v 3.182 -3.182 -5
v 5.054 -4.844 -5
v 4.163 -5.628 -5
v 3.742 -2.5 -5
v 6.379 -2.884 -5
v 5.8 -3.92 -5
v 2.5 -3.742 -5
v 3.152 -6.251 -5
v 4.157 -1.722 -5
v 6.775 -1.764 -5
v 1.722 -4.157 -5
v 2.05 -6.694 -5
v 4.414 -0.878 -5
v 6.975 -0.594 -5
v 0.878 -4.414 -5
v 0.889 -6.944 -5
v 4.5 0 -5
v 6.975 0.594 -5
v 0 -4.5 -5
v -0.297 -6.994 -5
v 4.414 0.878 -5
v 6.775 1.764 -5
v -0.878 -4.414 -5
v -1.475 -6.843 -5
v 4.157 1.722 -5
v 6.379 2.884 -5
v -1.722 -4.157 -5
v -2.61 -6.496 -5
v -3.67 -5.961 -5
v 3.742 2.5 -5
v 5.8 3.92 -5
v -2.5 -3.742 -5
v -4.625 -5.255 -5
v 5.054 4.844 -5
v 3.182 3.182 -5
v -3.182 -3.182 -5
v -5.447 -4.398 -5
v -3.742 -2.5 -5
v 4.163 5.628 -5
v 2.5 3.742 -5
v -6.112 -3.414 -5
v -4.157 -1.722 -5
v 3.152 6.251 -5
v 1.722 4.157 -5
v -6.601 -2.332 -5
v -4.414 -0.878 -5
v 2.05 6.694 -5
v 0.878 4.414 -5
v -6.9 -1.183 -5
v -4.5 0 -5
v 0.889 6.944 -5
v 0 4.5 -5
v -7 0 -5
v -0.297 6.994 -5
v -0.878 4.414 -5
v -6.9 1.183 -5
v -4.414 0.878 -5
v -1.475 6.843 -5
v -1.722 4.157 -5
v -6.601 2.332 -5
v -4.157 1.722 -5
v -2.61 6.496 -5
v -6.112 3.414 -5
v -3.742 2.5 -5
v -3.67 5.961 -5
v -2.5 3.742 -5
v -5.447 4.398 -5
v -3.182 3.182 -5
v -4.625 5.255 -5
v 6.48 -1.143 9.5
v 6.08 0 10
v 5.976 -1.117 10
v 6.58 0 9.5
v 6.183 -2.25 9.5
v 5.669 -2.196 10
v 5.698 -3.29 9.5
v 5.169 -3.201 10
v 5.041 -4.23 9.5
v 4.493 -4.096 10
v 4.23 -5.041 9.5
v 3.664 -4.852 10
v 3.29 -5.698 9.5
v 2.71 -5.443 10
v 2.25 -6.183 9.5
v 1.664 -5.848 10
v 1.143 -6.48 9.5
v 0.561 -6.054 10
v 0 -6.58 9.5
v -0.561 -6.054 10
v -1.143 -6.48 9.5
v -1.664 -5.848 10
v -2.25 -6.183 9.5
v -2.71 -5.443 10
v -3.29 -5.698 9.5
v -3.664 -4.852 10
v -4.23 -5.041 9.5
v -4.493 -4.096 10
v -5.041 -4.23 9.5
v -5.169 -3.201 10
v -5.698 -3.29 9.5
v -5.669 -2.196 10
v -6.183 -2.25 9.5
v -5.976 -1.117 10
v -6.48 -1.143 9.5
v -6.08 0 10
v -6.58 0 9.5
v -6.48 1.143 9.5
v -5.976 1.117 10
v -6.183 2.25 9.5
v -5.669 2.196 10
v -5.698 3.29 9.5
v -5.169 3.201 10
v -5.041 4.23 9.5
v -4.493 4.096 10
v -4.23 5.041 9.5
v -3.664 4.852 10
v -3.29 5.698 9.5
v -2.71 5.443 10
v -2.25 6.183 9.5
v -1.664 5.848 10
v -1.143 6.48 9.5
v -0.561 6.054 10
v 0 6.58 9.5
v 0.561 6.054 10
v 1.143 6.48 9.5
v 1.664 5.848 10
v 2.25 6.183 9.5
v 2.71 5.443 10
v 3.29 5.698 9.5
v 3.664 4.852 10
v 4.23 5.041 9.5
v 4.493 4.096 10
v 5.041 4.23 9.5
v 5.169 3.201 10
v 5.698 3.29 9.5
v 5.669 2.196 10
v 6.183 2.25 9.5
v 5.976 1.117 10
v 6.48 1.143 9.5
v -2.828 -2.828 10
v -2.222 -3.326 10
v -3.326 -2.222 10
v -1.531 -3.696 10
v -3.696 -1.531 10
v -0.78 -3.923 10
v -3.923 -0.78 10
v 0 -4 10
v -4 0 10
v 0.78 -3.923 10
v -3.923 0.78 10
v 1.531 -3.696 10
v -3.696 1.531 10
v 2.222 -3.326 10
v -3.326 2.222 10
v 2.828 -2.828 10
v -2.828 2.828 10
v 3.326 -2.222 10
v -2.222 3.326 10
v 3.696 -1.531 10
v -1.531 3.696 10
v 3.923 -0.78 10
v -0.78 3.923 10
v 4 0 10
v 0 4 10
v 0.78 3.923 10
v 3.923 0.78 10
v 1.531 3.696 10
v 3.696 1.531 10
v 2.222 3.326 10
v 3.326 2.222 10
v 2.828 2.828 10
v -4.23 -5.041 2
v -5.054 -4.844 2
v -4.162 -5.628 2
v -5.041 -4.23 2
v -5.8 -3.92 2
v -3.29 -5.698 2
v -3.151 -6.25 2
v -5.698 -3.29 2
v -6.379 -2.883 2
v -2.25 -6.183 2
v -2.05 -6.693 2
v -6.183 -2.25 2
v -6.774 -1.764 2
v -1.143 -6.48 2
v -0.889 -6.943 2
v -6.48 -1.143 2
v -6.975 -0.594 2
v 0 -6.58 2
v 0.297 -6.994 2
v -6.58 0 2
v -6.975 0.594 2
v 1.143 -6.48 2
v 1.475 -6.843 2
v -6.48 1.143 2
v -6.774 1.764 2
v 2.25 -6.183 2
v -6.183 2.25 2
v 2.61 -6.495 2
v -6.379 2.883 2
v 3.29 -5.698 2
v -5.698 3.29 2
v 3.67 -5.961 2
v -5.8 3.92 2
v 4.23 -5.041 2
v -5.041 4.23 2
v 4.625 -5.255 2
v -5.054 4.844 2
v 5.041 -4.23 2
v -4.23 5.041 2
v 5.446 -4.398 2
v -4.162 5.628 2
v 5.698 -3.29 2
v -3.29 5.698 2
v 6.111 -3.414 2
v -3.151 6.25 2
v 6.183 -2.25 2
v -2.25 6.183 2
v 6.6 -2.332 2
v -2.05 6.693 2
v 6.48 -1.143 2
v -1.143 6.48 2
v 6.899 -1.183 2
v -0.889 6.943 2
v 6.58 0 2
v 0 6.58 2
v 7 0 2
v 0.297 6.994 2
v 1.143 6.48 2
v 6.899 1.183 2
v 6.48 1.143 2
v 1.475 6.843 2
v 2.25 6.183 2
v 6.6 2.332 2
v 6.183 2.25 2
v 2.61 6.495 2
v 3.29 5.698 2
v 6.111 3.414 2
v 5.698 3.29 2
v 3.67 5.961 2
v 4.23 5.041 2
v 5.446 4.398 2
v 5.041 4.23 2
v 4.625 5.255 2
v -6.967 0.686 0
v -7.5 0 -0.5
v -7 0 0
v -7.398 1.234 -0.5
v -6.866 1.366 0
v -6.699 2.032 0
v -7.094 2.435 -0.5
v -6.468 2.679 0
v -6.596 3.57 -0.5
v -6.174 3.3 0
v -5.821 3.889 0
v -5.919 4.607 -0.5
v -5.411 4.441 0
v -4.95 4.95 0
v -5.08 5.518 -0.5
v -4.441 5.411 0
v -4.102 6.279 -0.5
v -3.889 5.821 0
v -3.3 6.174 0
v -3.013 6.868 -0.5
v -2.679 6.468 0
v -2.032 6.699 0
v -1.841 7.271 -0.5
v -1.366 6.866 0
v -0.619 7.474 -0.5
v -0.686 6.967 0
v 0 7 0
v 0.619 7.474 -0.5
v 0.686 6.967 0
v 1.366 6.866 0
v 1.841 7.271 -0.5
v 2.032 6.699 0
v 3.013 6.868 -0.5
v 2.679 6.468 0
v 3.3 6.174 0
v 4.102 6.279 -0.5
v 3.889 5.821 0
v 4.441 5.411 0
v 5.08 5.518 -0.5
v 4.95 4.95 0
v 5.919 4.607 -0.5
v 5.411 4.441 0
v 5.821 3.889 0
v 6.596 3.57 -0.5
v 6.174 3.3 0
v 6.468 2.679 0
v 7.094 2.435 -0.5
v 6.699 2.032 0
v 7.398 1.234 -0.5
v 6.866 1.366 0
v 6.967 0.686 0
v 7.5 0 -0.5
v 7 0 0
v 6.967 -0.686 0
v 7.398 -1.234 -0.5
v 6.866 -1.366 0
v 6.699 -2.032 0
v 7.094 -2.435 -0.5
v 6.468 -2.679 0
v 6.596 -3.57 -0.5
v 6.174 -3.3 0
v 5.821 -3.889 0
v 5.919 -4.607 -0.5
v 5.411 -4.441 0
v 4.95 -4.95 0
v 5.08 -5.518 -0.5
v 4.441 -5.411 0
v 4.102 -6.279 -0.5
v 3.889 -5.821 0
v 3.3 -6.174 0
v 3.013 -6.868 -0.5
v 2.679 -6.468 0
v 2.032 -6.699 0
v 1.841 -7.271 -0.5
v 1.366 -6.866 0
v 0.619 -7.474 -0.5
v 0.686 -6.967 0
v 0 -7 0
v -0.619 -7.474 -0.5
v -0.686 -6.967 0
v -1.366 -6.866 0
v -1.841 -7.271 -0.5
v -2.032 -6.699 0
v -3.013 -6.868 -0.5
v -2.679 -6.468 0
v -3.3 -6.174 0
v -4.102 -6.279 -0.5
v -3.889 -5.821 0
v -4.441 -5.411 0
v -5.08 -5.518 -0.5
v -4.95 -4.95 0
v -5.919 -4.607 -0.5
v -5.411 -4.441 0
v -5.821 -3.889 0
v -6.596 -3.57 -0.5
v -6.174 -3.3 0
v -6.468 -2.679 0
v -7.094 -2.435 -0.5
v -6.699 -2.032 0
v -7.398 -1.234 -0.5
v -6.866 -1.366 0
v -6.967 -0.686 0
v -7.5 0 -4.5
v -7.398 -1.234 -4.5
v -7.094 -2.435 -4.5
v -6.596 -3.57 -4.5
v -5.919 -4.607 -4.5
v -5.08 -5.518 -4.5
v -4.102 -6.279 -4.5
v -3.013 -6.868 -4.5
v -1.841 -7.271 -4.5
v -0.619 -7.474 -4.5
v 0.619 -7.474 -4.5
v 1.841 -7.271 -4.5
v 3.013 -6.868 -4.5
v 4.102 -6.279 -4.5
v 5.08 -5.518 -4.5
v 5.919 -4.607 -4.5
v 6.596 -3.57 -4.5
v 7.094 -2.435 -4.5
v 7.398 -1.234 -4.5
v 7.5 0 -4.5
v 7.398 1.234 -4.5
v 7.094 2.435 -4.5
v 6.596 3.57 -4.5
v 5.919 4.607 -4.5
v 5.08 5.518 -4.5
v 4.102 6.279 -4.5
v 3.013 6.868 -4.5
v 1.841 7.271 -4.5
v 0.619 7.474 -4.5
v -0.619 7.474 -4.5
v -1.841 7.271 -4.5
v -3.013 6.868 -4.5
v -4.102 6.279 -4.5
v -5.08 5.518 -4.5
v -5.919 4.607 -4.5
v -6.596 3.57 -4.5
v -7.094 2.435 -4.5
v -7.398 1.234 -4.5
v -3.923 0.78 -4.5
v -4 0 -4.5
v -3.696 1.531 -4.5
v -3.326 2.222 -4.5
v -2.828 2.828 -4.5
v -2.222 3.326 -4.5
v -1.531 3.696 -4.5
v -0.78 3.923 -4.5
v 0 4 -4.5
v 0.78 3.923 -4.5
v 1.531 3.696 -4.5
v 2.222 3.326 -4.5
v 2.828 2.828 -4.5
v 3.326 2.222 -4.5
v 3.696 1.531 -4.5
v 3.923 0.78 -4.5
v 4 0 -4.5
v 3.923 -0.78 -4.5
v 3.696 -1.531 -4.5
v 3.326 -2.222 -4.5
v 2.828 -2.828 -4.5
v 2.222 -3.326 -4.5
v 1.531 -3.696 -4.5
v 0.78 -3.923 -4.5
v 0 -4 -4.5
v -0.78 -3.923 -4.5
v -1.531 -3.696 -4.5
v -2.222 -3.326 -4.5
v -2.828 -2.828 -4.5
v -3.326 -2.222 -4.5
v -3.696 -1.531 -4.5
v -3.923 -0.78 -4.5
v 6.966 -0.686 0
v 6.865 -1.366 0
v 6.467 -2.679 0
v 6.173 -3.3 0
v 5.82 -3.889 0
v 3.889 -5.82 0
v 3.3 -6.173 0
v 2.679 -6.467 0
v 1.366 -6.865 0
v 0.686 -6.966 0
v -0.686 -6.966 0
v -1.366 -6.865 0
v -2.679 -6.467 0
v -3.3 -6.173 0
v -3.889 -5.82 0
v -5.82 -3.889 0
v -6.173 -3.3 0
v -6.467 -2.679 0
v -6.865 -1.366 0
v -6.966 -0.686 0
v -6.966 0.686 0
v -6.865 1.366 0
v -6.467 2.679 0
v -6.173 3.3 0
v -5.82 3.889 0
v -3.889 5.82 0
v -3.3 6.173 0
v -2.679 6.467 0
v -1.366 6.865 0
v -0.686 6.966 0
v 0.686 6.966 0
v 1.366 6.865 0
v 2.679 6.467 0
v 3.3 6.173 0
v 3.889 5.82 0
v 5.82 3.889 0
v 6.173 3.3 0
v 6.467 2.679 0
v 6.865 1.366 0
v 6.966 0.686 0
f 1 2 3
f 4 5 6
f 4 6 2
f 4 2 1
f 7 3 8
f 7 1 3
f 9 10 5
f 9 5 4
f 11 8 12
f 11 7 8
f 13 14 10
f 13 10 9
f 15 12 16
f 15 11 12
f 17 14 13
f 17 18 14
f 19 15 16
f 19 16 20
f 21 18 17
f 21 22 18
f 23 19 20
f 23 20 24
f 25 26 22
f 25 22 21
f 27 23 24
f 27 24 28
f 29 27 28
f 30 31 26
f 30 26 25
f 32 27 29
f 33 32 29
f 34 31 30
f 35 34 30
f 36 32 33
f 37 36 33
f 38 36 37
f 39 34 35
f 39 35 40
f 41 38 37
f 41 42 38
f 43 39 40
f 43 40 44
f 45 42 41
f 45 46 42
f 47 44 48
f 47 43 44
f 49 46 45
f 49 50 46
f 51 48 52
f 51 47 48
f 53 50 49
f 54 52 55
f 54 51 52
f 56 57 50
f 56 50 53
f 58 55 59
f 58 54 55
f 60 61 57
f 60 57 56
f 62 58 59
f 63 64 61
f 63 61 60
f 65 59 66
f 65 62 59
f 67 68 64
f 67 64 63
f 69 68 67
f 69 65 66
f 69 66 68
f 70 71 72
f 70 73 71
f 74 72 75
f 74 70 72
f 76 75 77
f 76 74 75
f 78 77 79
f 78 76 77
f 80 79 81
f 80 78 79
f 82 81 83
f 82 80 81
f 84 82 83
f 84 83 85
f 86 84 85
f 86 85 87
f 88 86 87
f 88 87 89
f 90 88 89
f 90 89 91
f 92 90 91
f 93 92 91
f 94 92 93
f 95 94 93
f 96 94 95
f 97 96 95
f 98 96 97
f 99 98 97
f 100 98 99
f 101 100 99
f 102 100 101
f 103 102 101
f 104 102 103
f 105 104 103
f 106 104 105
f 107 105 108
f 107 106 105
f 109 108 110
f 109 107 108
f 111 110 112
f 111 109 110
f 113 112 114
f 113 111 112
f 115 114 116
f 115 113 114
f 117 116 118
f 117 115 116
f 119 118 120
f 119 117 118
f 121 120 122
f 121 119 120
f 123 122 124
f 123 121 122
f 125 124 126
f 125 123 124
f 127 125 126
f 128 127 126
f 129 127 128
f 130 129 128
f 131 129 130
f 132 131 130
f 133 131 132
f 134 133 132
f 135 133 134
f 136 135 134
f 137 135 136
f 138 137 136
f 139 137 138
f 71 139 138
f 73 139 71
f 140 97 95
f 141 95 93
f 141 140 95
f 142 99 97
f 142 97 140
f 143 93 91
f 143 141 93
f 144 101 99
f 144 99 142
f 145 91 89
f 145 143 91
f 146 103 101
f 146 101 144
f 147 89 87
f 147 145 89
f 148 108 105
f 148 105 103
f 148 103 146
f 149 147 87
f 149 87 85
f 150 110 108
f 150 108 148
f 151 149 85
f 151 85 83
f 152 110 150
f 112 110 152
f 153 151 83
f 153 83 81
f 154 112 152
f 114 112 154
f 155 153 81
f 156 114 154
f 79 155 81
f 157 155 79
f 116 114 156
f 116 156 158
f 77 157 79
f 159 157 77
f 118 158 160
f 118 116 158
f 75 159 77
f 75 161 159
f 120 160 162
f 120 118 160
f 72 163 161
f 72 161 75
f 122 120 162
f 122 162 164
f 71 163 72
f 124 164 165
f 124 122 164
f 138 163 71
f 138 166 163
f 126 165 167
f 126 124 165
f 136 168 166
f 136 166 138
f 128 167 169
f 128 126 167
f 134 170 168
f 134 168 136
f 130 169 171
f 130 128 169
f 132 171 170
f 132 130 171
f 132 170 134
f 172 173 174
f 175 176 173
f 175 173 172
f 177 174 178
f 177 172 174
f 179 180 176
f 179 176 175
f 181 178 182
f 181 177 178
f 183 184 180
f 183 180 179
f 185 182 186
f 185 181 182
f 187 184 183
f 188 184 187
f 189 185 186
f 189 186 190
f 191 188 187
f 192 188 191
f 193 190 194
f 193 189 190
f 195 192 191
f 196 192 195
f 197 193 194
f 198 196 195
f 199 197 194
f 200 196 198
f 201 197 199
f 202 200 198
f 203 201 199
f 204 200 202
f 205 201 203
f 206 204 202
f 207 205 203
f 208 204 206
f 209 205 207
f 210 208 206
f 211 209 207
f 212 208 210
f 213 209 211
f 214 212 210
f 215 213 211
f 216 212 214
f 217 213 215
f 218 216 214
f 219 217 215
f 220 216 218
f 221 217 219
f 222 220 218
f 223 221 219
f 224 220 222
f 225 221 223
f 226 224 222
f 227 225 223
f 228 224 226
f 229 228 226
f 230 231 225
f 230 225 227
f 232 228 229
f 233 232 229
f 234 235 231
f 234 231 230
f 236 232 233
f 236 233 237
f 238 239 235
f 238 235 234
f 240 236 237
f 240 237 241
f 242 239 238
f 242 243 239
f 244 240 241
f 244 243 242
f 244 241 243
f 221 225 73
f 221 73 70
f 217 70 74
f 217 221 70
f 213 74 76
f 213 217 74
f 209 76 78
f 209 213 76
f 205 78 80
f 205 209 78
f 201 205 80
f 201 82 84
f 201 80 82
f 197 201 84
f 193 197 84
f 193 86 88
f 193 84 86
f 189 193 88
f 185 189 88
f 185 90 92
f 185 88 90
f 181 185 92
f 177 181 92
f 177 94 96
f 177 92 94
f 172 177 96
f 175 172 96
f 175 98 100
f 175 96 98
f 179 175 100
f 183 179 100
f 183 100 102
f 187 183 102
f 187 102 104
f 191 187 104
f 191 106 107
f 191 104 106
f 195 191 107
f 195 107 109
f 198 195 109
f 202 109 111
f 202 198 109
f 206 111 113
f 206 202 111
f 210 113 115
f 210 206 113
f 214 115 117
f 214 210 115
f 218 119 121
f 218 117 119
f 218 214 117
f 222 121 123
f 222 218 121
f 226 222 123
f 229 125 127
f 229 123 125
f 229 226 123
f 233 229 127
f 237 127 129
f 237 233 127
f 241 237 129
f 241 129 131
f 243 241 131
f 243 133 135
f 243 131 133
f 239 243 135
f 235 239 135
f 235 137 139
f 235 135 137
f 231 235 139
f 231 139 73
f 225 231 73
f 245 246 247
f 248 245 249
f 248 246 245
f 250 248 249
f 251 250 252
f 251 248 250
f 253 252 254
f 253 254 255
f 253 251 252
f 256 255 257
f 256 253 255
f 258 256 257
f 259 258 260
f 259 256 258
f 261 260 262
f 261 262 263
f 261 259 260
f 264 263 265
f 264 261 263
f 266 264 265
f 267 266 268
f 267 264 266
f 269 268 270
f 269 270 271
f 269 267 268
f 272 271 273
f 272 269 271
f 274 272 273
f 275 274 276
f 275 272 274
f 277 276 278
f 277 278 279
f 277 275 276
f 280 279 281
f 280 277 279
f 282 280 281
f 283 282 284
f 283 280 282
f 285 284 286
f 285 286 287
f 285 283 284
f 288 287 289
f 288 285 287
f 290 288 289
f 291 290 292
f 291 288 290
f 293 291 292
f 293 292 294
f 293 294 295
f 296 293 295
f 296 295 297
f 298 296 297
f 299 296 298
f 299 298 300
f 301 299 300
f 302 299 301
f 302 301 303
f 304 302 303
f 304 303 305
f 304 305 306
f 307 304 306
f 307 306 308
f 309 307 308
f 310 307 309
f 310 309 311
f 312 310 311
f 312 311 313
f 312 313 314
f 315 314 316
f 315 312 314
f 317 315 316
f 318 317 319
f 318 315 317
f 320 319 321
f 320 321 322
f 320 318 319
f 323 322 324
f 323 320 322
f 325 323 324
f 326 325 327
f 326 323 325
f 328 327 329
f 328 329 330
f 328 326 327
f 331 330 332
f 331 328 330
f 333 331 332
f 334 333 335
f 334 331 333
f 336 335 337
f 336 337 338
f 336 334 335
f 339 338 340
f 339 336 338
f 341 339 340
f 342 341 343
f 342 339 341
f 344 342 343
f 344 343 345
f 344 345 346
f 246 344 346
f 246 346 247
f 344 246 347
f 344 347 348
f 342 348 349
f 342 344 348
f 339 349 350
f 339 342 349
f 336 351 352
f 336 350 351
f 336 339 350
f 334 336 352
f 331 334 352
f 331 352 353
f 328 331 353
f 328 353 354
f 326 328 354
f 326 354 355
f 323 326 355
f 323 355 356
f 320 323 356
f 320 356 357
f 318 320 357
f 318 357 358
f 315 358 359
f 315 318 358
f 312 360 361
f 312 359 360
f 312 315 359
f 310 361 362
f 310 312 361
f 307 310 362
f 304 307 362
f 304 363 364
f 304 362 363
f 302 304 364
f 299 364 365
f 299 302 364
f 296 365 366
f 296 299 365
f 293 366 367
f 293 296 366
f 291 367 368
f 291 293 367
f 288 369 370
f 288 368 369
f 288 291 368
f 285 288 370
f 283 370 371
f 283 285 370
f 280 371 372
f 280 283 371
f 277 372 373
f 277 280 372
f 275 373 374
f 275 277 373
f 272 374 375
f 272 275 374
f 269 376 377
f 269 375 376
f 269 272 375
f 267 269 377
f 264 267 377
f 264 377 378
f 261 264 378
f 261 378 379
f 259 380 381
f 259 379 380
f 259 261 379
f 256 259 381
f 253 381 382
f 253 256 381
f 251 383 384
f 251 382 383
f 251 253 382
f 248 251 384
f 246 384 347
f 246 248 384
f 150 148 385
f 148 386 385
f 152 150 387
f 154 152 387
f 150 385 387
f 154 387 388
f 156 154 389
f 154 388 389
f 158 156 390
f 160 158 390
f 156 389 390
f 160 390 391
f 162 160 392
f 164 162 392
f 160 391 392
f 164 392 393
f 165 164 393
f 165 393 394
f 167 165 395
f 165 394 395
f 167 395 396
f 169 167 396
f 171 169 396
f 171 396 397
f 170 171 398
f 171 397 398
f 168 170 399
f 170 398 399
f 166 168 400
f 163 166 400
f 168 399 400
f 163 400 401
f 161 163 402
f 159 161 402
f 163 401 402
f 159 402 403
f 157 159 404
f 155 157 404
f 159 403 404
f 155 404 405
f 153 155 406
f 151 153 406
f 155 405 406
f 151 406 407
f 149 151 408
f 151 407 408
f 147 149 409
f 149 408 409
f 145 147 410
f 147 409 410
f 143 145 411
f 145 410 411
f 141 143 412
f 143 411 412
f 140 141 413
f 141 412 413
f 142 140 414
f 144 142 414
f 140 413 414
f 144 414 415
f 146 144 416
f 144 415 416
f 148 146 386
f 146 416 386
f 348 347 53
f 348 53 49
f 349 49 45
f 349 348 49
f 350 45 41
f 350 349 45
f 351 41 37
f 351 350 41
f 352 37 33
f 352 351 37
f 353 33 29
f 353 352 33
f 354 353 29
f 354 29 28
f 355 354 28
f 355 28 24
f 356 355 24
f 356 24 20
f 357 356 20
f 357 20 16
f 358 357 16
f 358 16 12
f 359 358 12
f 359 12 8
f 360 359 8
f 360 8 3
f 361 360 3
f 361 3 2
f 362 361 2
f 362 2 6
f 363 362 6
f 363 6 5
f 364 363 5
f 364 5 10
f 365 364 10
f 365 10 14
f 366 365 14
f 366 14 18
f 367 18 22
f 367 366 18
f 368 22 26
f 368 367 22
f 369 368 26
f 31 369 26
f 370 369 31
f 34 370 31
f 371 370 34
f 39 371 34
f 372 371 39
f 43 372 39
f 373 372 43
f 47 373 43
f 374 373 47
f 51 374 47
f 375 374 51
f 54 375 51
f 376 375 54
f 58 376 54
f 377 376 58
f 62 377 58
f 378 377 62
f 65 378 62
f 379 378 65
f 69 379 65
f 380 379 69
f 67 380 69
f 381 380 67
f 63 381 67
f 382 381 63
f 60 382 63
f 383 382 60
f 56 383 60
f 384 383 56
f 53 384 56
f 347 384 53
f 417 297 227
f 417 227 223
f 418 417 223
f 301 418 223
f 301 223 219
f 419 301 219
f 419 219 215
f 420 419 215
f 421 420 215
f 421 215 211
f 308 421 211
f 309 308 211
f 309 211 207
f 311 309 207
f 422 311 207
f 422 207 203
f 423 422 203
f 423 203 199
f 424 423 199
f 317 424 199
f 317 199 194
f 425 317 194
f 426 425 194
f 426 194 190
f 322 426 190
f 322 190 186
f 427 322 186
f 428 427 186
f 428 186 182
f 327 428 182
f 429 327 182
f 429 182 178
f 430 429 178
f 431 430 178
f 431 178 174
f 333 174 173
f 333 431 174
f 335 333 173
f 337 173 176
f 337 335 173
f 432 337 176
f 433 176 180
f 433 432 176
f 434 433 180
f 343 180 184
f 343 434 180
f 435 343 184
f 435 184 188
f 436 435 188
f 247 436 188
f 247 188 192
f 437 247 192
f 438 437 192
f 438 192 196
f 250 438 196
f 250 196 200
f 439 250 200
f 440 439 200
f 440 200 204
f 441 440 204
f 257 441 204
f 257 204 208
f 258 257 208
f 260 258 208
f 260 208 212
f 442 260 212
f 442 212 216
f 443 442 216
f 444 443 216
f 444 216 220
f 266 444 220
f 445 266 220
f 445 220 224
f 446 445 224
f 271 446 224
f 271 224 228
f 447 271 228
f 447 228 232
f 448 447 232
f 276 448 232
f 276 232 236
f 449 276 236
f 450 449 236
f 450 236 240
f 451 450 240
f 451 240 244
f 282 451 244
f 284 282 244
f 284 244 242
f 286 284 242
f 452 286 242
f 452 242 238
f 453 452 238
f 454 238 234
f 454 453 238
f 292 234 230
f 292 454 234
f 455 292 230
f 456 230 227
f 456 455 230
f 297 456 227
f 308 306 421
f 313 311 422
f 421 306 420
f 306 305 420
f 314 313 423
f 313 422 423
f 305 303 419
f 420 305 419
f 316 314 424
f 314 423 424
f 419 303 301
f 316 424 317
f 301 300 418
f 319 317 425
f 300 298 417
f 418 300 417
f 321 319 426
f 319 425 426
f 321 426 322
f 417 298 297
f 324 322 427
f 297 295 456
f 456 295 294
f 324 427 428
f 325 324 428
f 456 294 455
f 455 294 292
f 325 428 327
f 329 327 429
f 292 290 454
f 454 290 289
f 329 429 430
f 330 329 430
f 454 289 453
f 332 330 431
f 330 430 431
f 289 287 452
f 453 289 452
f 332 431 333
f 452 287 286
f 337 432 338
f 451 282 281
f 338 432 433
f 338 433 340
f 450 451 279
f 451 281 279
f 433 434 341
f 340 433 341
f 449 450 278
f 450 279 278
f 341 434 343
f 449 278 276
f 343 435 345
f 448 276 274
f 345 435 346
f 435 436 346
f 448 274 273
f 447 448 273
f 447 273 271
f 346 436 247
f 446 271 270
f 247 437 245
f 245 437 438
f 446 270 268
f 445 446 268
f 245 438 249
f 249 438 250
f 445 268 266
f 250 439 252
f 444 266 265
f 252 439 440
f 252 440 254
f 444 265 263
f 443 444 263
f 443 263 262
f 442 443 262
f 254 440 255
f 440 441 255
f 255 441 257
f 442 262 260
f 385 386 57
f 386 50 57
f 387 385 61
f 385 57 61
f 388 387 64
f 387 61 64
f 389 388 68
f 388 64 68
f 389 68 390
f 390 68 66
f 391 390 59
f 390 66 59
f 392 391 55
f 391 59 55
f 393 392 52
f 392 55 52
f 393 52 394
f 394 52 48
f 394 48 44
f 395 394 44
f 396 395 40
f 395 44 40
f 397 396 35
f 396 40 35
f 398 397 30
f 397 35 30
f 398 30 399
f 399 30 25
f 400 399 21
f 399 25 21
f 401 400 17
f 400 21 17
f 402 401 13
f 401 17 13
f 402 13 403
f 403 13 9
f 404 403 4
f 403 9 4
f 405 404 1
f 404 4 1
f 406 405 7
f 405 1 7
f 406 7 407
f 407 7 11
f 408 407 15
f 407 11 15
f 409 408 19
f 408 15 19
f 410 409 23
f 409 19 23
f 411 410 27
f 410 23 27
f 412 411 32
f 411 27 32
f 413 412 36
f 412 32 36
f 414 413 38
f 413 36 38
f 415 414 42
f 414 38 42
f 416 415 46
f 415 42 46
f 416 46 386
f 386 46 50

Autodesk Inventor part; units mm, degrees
ref_plane "YZ Plane" through (0, 0, 0) normal (1, 0, 0) x (0, 1, 0)
ref_plane "XZ Plane" through (0, 0, 0) normal (0, 1, 0) x (-1, 0, 0)
ref_plane "XY Plane" through (0, 0, 0) normal (0, 0, 1) x (1, 0, 0)
sketch "Skizze1" plane through (0, 0, 0) normal (0, 0, 1) x (1, 0, 0)
  line L0 (-9.8, 0) -> (9.8, 0) projected
  line L1 (0, -9.8) -> (0, 9.8) projected
  circle A0 centre (0, 0) radius 7
  point P0 (0, 7)
  point P1 (-7, 0)
  point P2 (0, -7)
  point P3 (7, 0)
  dimension "d19" = 14
extrude "Extrusion1" add sketch "Skizze1" along normal blind 2
sketch "Skizze2" plane through (0, 0, 0) normal (0, 0, -1) x (-1, 0, 0)
  circle A0 centre (0, 0) radius 7.5
  dimension "d7" = 15
extrude "Extrusion2" add sketch "Skizze2" along normal blind 5
chamfer "Fase2" distance 0.5 angle 45 2 edges at (7.5, 0, 0) (7.5, 0, -5)
sketch "Skizze4" plane through (0, 0, 2) normal (0, 0, 1) x (1, 0, 0)
  circle A0 centre (0, 0) radius 6.58
  dimension "d20" = 13.16
extrude "Extrusion4" add sketch "Skizze4" along normal blind 8
thread "Gewinde2" size "G13.157x1.337" designation "G 1/4" class "A" standard "ISO Pipe Threads" length 8
chamfer "Fase4" distance 0.5 angle 45 1 edges at (-6.58, 0, 10)
sketch "Skizze5" plane through (0, 0, -5) normal (0, 0, -1) x (-1, 0, 0)
  circle A0 centre (0, 0) radius 4
  dimension "d28" = 8
extrude "Extrusion5" cut sketch "Skizze5" against normal blind 15
chamfer "Fase5" distance 0.5 angle 45 1 edges at (4, 0, -5)
properties part number "Schlauchsteckverbindung"
